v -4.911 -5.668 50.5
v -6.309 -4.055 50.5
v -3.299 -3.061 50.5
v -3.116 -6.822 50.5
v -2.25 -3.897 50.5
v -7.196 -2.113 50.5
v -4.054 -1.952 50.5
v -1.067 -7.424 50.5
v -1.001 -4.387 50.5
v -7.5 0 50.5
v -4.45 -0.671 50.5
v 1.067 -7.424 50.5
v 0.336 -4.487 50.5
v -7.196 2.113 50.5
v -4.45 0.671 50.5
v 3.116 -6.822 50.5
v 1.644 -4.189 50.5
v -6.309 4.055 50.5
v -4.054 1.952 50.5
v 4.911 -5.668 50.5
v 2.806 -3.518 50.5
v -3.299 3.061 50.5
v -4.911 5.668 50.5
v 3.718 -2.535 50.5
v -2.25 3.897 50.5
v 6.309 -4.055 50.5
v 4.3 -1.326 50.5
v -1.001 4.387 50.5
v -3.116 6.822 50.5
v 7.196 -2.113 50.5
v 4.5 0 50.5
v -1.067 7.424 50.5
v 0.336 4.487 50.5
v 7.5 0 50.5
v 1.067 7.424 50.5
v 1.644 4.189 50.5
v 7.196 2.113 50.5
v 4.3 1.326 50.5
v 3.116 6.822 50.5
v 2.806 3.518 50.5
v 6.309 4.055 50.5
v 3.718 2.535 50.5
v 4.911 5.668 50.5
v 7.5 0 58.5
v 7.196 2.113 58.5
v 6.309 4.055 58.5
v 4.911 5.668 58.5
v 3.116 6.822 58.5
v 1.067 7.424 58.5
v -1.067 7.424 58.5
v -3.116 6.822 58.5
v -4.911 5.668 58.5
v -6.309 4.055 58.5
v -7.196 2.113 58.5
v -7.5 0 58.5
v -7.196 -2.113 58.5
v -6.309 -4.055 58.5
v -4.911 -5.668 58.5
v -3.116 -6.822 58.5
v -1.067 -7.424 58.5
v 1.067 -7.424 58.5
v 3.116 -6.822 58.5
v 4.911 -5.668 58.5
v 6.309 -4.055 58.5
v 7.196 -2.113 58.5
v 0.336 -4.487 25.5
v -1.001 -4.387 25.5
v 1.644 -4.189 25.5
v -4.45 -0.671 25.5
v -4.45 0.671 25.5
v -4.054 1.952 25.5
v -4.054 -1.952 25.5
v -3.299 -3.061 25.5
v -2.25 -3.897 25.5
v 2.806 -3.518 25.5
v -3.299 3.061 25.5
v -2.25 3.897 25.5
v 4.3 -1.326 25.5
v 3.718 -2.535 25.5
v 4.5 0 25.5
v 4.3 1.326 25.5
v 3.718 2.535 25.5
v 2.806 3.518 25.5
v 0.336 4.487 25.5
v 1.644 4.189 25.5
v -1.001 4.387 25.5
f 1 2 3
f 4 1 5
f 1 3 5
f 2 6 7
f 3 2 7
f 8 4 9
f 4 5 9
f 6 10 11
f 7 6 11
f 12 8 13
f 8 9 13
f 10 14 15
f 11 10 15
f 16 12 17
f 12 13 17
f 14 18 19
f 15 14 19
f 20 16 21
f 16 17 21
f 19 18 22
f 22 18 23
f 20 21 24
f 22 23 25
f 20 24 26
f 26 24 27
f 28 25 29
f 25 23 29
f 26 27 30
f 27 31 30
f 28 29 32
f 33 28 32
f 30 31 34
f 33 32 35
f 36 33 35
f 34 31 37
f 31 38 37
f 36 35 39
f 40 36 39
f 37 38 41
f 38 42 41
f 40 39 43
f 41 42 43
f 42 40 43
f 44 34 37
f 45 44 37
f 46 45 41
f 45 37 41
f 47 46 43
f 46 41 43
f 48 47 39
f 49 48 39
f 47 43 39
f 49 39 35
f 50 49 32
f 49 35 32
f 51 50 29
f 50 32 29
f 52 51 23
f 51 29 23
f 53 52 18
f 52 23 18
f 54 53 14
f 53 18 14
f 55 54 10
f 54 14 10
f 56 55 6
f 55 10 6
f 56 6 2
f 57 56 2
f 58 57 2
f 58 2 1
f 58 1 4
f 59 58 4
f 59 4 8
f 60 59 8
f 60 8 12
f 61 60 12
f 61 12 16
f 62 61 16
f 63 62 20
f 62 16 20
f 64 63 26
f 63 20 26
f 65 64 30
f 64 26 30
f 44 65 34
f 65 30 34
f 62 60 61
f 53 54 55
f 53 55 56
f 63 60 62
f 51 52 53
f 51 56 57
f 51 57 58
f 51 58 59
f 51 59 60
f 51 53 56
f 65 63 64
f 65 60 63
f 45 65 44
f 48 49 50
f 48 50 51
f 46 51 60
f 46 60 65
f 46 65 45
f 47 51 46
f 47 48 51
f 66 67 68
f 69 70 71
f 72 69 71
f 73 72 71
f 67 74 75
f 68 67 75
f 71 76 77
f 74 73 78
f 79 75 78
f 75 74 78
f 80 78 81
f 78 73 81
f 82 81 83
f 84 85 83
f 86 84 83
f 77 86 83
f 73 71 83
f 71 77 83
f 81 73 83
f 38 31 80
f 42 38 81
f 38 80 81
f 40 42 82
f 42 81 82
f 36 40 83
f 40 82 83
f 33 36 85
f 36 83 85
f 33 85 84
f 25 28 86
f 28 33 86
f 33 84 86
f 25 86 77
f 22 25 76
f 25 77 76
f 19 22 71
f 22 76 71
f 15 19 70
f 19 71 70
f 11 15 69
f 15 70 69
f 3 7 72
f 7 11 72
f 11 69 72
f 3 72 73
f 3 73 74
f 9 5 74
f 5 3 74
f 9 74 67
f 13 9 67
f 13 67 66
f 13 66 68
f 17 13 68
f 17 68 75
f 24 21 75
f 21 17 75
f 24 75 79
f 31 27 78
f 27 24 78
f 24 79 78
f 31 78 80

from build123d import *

# Parameters (mm, degrees)
CYLINDER014_R     = 4.5
CYLINDER014_DEPTH = 33
CYLINDER015_R     = 7.5
CYLINDER015_DEPTH = 8


with BuildPart() as cylinder014:
    # Cylinder014 → Cylinder014 (new body)
    with BuildSketch(Plane.XY.offset(25.5)):
        Circle(CYLINDER014_R)
    extrude(amount=CYLINDER014_DEPTH)


with BuildPart() as screwspacem8:
    # Cylinder015 → Cylinder015 (new body)
    with BuildSketch(Plane.XY.offset(50.5)):
        Circle(CYLINDER015_R)
    extrude(amount=CYLINDER015_DEPTH)

    # Fusion004: union Cylinder014
    add(cylinder014.part)


solid = screwspacem8.part
